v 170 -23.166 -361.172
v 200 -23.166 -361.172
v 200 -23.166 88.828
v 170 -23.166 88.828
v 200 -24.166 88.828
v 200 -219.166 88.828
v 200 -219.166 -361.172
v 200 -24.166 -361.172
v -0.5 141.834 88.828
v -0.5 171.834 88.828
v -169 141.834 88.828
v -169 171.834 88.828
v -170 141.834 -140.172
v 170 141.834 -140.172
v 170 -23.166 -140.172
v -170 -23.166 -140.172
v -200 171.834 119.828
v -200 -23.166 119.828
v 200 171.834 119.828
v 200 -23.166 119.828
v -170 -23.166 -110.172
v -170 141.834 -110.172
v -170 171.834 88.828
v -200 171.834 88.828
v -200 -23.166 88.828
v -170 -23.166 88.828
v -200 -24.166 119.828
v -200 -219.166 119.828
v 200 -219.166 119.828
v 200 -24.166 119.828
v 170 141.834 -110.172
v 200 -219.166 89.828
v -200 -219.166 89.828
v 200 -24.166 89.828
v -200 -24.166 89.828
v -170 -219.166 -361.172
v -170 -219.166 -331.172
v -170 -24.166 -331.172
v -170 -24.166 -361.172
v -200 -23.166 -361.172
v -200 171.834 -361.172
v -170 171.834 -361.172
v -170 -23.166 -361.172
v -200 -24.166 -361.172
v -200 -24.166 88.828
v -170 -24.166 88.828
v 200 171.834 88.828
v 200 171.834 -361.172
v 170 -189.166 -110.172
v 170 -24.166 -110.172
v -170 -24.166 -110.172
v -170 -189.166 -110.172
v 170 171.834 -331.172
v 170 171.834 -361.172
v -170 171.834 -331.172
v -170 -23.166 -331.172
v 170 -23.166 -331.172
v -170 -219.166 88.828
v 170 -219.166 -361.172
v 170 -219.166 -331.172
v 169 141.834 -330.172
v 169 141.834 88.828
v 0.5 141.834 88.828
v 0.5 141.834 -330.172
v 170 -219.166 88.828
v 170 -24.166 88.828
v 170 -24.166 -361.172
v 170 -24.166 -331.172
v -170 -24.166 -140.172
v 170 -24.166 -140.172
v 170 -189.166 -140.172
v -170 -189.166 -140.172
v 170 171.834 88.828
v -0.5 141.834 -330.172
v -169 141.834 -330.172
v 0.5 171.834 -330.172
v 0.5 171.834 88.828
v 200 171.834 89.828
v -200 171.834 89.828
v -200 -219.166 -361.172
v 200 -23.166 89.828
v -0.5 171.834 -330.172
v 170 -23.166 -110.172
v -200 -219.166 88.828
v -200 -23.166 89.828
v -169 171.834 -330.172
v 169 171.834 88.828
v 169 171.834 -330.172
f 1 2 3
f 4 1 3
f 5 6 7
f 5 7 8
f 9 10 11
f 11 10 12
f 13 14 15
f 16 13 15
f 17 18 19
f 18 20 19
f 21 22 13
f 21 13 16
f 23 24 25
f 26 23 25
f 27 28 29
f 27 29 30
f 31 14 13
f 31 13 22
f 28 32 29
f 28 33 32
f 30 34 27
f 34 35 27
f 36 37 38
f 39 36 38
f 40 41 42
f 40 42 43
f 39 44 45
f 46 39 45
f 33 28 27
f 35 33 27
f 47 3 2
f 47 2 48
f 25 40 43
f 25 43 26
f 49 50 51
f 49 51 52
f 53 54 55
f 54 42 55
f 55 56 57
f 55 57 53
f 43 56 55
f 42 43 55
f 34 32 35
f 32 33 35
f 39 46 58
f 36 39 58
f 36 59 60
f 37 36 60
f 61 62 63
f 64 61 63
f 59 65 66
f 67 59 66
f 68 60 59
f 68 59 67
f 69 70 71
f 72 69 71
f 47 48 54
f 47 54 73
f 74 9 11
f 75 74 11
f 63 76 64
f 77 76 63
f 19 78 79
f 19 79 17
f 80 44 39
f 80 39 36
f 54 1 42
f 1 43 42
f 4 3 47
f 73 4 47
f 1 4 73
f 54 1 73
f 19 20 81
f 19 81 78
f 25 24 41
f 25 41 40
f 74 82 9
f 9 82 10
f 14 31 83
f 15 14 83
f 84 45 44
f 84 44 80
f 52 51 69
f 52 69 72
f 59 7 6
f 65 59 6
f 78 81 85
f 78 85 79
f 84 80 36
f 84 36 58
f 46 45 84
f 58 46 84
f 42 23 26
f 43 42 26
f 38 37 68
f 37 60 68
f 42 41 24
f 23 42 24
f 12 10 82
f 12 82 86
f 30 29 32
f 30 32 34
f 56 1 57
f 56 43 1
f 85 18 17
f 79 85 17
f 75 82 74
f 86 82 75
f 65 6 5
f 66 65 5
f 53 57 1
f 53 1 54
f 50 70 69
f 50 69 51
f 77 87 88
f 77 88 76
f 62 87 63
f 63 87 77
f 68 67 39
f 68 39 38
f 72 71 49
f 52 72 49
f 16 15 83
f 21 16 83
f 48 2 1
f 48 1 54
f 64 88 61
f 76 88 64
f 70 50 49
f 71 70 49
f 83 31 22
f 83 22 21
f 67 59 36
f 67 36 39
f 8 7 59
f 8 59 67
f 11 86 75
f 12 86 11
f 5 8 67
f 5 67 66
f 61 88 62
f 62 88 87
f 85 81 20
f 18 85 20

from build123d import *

# Parameters (mm, degrees)
F0_W      = 195
F0_H      = 30
F1_DEPTH  = 200
F2_W      = 195
F2_H      = 450
F3_DEPTH  = 30
F4_W      = 195
F4_H      = 450
F5_DEPTH  = 30
F6_W      = 195
F6_H      = 30
F7_DEPTH  = 170
F8_W      = 168.5
F8_H      = 419
F9_DEPTH  = 30
F10_W     = 165
F10_H     = 30
F11_DEPTH = 340


with BuildPart() as f1:
    # F0 (on Right) → F1 (new body, symmetric)
    with BuildSketch(Plane.YZ):
        with Locations((-121.665683, 104.827926)):
            Rectangle(F0_W, F0_H)
        with Locations((74.334317, 104.827926)):
            Rectangle(F0_W, F0_H)
    extrude(amount=F1_DEPTH, both=True)


with BuildPart() as f3:
    # F2 (on face) → F3 (new body)
    with BuildSketch(Plane.YZ.offset(200)):
        with Locations((-121.665683, -136.172074)):
            Rectangle(F2_W, F2_H)
        with Locations((74.334317, -136.172074)):
            Rectangle(F2_W, F2_H)
    extrude(amount=-F3_DEPTH)


with BuildPart() as f5:
    # F4 (on face) → F5 (new body)
    with BuildSketch(Plane(origin=(-200, 0, 0), x_dir=(0, -1, 0), z_dir=(-1, 0, 0))):
        with Locations((-74.334317, -136.172074)):
            Rectangle(F4_W, F4_H)
        with Locations((121.665683, -136.172074)):
            Rectangle(F4_W, F4_H)
    extrude(amount=-F5_DEPTH)


with BuildPart() as f7:
    # F6 (on Right) → F7 (new body, symmetric)
    with BuildSketch(Plane.YZ):
        with Locations((74.334317, -346.172074)):
            Rectangle(F6_W, F6_H)
        with Locations((-121.665683, -346.172074)):
            Rectangle(F6_W, F6_H)
    extrude(amount=F7_DEPTH, both=True)


with BuildPart() as f9:
    # F8 (on face) → F9 (new body)
    with BuildSketch(Plane(origin=(0, 171.834317, 0), x_dir=(-1, 0, 0), z_dir=(0, 1, 0))):
        with Locations((-84.75, -120.672074)):
            Rectangle(F8_W, F8_H)
        with Locations((84.75, -120.672074)):
            Rectangle(F8_W, F8_H)
    extrude(amount=-F9_DEPTH)


with BuildPart() as f11:
    # F10 (on face) → F11 (new body)
    with BuildSketch(Plane(origin=(170, 0, 0), x_dir=(0, -1, 0), z_dir=(-1, 0, 0))):
        with Locations((106.665683, -125.172074)):
            Rectangle(F10_W, F10_H)
        with Locations((-59.334317, -125.172074)):
            Rectangle(F10_W, F10_H)
    extrude(amount=F11_DEPTH)


solid = Compound([f1.part, f3.part, f5.part, f7.part, f9.part, f11.part])
